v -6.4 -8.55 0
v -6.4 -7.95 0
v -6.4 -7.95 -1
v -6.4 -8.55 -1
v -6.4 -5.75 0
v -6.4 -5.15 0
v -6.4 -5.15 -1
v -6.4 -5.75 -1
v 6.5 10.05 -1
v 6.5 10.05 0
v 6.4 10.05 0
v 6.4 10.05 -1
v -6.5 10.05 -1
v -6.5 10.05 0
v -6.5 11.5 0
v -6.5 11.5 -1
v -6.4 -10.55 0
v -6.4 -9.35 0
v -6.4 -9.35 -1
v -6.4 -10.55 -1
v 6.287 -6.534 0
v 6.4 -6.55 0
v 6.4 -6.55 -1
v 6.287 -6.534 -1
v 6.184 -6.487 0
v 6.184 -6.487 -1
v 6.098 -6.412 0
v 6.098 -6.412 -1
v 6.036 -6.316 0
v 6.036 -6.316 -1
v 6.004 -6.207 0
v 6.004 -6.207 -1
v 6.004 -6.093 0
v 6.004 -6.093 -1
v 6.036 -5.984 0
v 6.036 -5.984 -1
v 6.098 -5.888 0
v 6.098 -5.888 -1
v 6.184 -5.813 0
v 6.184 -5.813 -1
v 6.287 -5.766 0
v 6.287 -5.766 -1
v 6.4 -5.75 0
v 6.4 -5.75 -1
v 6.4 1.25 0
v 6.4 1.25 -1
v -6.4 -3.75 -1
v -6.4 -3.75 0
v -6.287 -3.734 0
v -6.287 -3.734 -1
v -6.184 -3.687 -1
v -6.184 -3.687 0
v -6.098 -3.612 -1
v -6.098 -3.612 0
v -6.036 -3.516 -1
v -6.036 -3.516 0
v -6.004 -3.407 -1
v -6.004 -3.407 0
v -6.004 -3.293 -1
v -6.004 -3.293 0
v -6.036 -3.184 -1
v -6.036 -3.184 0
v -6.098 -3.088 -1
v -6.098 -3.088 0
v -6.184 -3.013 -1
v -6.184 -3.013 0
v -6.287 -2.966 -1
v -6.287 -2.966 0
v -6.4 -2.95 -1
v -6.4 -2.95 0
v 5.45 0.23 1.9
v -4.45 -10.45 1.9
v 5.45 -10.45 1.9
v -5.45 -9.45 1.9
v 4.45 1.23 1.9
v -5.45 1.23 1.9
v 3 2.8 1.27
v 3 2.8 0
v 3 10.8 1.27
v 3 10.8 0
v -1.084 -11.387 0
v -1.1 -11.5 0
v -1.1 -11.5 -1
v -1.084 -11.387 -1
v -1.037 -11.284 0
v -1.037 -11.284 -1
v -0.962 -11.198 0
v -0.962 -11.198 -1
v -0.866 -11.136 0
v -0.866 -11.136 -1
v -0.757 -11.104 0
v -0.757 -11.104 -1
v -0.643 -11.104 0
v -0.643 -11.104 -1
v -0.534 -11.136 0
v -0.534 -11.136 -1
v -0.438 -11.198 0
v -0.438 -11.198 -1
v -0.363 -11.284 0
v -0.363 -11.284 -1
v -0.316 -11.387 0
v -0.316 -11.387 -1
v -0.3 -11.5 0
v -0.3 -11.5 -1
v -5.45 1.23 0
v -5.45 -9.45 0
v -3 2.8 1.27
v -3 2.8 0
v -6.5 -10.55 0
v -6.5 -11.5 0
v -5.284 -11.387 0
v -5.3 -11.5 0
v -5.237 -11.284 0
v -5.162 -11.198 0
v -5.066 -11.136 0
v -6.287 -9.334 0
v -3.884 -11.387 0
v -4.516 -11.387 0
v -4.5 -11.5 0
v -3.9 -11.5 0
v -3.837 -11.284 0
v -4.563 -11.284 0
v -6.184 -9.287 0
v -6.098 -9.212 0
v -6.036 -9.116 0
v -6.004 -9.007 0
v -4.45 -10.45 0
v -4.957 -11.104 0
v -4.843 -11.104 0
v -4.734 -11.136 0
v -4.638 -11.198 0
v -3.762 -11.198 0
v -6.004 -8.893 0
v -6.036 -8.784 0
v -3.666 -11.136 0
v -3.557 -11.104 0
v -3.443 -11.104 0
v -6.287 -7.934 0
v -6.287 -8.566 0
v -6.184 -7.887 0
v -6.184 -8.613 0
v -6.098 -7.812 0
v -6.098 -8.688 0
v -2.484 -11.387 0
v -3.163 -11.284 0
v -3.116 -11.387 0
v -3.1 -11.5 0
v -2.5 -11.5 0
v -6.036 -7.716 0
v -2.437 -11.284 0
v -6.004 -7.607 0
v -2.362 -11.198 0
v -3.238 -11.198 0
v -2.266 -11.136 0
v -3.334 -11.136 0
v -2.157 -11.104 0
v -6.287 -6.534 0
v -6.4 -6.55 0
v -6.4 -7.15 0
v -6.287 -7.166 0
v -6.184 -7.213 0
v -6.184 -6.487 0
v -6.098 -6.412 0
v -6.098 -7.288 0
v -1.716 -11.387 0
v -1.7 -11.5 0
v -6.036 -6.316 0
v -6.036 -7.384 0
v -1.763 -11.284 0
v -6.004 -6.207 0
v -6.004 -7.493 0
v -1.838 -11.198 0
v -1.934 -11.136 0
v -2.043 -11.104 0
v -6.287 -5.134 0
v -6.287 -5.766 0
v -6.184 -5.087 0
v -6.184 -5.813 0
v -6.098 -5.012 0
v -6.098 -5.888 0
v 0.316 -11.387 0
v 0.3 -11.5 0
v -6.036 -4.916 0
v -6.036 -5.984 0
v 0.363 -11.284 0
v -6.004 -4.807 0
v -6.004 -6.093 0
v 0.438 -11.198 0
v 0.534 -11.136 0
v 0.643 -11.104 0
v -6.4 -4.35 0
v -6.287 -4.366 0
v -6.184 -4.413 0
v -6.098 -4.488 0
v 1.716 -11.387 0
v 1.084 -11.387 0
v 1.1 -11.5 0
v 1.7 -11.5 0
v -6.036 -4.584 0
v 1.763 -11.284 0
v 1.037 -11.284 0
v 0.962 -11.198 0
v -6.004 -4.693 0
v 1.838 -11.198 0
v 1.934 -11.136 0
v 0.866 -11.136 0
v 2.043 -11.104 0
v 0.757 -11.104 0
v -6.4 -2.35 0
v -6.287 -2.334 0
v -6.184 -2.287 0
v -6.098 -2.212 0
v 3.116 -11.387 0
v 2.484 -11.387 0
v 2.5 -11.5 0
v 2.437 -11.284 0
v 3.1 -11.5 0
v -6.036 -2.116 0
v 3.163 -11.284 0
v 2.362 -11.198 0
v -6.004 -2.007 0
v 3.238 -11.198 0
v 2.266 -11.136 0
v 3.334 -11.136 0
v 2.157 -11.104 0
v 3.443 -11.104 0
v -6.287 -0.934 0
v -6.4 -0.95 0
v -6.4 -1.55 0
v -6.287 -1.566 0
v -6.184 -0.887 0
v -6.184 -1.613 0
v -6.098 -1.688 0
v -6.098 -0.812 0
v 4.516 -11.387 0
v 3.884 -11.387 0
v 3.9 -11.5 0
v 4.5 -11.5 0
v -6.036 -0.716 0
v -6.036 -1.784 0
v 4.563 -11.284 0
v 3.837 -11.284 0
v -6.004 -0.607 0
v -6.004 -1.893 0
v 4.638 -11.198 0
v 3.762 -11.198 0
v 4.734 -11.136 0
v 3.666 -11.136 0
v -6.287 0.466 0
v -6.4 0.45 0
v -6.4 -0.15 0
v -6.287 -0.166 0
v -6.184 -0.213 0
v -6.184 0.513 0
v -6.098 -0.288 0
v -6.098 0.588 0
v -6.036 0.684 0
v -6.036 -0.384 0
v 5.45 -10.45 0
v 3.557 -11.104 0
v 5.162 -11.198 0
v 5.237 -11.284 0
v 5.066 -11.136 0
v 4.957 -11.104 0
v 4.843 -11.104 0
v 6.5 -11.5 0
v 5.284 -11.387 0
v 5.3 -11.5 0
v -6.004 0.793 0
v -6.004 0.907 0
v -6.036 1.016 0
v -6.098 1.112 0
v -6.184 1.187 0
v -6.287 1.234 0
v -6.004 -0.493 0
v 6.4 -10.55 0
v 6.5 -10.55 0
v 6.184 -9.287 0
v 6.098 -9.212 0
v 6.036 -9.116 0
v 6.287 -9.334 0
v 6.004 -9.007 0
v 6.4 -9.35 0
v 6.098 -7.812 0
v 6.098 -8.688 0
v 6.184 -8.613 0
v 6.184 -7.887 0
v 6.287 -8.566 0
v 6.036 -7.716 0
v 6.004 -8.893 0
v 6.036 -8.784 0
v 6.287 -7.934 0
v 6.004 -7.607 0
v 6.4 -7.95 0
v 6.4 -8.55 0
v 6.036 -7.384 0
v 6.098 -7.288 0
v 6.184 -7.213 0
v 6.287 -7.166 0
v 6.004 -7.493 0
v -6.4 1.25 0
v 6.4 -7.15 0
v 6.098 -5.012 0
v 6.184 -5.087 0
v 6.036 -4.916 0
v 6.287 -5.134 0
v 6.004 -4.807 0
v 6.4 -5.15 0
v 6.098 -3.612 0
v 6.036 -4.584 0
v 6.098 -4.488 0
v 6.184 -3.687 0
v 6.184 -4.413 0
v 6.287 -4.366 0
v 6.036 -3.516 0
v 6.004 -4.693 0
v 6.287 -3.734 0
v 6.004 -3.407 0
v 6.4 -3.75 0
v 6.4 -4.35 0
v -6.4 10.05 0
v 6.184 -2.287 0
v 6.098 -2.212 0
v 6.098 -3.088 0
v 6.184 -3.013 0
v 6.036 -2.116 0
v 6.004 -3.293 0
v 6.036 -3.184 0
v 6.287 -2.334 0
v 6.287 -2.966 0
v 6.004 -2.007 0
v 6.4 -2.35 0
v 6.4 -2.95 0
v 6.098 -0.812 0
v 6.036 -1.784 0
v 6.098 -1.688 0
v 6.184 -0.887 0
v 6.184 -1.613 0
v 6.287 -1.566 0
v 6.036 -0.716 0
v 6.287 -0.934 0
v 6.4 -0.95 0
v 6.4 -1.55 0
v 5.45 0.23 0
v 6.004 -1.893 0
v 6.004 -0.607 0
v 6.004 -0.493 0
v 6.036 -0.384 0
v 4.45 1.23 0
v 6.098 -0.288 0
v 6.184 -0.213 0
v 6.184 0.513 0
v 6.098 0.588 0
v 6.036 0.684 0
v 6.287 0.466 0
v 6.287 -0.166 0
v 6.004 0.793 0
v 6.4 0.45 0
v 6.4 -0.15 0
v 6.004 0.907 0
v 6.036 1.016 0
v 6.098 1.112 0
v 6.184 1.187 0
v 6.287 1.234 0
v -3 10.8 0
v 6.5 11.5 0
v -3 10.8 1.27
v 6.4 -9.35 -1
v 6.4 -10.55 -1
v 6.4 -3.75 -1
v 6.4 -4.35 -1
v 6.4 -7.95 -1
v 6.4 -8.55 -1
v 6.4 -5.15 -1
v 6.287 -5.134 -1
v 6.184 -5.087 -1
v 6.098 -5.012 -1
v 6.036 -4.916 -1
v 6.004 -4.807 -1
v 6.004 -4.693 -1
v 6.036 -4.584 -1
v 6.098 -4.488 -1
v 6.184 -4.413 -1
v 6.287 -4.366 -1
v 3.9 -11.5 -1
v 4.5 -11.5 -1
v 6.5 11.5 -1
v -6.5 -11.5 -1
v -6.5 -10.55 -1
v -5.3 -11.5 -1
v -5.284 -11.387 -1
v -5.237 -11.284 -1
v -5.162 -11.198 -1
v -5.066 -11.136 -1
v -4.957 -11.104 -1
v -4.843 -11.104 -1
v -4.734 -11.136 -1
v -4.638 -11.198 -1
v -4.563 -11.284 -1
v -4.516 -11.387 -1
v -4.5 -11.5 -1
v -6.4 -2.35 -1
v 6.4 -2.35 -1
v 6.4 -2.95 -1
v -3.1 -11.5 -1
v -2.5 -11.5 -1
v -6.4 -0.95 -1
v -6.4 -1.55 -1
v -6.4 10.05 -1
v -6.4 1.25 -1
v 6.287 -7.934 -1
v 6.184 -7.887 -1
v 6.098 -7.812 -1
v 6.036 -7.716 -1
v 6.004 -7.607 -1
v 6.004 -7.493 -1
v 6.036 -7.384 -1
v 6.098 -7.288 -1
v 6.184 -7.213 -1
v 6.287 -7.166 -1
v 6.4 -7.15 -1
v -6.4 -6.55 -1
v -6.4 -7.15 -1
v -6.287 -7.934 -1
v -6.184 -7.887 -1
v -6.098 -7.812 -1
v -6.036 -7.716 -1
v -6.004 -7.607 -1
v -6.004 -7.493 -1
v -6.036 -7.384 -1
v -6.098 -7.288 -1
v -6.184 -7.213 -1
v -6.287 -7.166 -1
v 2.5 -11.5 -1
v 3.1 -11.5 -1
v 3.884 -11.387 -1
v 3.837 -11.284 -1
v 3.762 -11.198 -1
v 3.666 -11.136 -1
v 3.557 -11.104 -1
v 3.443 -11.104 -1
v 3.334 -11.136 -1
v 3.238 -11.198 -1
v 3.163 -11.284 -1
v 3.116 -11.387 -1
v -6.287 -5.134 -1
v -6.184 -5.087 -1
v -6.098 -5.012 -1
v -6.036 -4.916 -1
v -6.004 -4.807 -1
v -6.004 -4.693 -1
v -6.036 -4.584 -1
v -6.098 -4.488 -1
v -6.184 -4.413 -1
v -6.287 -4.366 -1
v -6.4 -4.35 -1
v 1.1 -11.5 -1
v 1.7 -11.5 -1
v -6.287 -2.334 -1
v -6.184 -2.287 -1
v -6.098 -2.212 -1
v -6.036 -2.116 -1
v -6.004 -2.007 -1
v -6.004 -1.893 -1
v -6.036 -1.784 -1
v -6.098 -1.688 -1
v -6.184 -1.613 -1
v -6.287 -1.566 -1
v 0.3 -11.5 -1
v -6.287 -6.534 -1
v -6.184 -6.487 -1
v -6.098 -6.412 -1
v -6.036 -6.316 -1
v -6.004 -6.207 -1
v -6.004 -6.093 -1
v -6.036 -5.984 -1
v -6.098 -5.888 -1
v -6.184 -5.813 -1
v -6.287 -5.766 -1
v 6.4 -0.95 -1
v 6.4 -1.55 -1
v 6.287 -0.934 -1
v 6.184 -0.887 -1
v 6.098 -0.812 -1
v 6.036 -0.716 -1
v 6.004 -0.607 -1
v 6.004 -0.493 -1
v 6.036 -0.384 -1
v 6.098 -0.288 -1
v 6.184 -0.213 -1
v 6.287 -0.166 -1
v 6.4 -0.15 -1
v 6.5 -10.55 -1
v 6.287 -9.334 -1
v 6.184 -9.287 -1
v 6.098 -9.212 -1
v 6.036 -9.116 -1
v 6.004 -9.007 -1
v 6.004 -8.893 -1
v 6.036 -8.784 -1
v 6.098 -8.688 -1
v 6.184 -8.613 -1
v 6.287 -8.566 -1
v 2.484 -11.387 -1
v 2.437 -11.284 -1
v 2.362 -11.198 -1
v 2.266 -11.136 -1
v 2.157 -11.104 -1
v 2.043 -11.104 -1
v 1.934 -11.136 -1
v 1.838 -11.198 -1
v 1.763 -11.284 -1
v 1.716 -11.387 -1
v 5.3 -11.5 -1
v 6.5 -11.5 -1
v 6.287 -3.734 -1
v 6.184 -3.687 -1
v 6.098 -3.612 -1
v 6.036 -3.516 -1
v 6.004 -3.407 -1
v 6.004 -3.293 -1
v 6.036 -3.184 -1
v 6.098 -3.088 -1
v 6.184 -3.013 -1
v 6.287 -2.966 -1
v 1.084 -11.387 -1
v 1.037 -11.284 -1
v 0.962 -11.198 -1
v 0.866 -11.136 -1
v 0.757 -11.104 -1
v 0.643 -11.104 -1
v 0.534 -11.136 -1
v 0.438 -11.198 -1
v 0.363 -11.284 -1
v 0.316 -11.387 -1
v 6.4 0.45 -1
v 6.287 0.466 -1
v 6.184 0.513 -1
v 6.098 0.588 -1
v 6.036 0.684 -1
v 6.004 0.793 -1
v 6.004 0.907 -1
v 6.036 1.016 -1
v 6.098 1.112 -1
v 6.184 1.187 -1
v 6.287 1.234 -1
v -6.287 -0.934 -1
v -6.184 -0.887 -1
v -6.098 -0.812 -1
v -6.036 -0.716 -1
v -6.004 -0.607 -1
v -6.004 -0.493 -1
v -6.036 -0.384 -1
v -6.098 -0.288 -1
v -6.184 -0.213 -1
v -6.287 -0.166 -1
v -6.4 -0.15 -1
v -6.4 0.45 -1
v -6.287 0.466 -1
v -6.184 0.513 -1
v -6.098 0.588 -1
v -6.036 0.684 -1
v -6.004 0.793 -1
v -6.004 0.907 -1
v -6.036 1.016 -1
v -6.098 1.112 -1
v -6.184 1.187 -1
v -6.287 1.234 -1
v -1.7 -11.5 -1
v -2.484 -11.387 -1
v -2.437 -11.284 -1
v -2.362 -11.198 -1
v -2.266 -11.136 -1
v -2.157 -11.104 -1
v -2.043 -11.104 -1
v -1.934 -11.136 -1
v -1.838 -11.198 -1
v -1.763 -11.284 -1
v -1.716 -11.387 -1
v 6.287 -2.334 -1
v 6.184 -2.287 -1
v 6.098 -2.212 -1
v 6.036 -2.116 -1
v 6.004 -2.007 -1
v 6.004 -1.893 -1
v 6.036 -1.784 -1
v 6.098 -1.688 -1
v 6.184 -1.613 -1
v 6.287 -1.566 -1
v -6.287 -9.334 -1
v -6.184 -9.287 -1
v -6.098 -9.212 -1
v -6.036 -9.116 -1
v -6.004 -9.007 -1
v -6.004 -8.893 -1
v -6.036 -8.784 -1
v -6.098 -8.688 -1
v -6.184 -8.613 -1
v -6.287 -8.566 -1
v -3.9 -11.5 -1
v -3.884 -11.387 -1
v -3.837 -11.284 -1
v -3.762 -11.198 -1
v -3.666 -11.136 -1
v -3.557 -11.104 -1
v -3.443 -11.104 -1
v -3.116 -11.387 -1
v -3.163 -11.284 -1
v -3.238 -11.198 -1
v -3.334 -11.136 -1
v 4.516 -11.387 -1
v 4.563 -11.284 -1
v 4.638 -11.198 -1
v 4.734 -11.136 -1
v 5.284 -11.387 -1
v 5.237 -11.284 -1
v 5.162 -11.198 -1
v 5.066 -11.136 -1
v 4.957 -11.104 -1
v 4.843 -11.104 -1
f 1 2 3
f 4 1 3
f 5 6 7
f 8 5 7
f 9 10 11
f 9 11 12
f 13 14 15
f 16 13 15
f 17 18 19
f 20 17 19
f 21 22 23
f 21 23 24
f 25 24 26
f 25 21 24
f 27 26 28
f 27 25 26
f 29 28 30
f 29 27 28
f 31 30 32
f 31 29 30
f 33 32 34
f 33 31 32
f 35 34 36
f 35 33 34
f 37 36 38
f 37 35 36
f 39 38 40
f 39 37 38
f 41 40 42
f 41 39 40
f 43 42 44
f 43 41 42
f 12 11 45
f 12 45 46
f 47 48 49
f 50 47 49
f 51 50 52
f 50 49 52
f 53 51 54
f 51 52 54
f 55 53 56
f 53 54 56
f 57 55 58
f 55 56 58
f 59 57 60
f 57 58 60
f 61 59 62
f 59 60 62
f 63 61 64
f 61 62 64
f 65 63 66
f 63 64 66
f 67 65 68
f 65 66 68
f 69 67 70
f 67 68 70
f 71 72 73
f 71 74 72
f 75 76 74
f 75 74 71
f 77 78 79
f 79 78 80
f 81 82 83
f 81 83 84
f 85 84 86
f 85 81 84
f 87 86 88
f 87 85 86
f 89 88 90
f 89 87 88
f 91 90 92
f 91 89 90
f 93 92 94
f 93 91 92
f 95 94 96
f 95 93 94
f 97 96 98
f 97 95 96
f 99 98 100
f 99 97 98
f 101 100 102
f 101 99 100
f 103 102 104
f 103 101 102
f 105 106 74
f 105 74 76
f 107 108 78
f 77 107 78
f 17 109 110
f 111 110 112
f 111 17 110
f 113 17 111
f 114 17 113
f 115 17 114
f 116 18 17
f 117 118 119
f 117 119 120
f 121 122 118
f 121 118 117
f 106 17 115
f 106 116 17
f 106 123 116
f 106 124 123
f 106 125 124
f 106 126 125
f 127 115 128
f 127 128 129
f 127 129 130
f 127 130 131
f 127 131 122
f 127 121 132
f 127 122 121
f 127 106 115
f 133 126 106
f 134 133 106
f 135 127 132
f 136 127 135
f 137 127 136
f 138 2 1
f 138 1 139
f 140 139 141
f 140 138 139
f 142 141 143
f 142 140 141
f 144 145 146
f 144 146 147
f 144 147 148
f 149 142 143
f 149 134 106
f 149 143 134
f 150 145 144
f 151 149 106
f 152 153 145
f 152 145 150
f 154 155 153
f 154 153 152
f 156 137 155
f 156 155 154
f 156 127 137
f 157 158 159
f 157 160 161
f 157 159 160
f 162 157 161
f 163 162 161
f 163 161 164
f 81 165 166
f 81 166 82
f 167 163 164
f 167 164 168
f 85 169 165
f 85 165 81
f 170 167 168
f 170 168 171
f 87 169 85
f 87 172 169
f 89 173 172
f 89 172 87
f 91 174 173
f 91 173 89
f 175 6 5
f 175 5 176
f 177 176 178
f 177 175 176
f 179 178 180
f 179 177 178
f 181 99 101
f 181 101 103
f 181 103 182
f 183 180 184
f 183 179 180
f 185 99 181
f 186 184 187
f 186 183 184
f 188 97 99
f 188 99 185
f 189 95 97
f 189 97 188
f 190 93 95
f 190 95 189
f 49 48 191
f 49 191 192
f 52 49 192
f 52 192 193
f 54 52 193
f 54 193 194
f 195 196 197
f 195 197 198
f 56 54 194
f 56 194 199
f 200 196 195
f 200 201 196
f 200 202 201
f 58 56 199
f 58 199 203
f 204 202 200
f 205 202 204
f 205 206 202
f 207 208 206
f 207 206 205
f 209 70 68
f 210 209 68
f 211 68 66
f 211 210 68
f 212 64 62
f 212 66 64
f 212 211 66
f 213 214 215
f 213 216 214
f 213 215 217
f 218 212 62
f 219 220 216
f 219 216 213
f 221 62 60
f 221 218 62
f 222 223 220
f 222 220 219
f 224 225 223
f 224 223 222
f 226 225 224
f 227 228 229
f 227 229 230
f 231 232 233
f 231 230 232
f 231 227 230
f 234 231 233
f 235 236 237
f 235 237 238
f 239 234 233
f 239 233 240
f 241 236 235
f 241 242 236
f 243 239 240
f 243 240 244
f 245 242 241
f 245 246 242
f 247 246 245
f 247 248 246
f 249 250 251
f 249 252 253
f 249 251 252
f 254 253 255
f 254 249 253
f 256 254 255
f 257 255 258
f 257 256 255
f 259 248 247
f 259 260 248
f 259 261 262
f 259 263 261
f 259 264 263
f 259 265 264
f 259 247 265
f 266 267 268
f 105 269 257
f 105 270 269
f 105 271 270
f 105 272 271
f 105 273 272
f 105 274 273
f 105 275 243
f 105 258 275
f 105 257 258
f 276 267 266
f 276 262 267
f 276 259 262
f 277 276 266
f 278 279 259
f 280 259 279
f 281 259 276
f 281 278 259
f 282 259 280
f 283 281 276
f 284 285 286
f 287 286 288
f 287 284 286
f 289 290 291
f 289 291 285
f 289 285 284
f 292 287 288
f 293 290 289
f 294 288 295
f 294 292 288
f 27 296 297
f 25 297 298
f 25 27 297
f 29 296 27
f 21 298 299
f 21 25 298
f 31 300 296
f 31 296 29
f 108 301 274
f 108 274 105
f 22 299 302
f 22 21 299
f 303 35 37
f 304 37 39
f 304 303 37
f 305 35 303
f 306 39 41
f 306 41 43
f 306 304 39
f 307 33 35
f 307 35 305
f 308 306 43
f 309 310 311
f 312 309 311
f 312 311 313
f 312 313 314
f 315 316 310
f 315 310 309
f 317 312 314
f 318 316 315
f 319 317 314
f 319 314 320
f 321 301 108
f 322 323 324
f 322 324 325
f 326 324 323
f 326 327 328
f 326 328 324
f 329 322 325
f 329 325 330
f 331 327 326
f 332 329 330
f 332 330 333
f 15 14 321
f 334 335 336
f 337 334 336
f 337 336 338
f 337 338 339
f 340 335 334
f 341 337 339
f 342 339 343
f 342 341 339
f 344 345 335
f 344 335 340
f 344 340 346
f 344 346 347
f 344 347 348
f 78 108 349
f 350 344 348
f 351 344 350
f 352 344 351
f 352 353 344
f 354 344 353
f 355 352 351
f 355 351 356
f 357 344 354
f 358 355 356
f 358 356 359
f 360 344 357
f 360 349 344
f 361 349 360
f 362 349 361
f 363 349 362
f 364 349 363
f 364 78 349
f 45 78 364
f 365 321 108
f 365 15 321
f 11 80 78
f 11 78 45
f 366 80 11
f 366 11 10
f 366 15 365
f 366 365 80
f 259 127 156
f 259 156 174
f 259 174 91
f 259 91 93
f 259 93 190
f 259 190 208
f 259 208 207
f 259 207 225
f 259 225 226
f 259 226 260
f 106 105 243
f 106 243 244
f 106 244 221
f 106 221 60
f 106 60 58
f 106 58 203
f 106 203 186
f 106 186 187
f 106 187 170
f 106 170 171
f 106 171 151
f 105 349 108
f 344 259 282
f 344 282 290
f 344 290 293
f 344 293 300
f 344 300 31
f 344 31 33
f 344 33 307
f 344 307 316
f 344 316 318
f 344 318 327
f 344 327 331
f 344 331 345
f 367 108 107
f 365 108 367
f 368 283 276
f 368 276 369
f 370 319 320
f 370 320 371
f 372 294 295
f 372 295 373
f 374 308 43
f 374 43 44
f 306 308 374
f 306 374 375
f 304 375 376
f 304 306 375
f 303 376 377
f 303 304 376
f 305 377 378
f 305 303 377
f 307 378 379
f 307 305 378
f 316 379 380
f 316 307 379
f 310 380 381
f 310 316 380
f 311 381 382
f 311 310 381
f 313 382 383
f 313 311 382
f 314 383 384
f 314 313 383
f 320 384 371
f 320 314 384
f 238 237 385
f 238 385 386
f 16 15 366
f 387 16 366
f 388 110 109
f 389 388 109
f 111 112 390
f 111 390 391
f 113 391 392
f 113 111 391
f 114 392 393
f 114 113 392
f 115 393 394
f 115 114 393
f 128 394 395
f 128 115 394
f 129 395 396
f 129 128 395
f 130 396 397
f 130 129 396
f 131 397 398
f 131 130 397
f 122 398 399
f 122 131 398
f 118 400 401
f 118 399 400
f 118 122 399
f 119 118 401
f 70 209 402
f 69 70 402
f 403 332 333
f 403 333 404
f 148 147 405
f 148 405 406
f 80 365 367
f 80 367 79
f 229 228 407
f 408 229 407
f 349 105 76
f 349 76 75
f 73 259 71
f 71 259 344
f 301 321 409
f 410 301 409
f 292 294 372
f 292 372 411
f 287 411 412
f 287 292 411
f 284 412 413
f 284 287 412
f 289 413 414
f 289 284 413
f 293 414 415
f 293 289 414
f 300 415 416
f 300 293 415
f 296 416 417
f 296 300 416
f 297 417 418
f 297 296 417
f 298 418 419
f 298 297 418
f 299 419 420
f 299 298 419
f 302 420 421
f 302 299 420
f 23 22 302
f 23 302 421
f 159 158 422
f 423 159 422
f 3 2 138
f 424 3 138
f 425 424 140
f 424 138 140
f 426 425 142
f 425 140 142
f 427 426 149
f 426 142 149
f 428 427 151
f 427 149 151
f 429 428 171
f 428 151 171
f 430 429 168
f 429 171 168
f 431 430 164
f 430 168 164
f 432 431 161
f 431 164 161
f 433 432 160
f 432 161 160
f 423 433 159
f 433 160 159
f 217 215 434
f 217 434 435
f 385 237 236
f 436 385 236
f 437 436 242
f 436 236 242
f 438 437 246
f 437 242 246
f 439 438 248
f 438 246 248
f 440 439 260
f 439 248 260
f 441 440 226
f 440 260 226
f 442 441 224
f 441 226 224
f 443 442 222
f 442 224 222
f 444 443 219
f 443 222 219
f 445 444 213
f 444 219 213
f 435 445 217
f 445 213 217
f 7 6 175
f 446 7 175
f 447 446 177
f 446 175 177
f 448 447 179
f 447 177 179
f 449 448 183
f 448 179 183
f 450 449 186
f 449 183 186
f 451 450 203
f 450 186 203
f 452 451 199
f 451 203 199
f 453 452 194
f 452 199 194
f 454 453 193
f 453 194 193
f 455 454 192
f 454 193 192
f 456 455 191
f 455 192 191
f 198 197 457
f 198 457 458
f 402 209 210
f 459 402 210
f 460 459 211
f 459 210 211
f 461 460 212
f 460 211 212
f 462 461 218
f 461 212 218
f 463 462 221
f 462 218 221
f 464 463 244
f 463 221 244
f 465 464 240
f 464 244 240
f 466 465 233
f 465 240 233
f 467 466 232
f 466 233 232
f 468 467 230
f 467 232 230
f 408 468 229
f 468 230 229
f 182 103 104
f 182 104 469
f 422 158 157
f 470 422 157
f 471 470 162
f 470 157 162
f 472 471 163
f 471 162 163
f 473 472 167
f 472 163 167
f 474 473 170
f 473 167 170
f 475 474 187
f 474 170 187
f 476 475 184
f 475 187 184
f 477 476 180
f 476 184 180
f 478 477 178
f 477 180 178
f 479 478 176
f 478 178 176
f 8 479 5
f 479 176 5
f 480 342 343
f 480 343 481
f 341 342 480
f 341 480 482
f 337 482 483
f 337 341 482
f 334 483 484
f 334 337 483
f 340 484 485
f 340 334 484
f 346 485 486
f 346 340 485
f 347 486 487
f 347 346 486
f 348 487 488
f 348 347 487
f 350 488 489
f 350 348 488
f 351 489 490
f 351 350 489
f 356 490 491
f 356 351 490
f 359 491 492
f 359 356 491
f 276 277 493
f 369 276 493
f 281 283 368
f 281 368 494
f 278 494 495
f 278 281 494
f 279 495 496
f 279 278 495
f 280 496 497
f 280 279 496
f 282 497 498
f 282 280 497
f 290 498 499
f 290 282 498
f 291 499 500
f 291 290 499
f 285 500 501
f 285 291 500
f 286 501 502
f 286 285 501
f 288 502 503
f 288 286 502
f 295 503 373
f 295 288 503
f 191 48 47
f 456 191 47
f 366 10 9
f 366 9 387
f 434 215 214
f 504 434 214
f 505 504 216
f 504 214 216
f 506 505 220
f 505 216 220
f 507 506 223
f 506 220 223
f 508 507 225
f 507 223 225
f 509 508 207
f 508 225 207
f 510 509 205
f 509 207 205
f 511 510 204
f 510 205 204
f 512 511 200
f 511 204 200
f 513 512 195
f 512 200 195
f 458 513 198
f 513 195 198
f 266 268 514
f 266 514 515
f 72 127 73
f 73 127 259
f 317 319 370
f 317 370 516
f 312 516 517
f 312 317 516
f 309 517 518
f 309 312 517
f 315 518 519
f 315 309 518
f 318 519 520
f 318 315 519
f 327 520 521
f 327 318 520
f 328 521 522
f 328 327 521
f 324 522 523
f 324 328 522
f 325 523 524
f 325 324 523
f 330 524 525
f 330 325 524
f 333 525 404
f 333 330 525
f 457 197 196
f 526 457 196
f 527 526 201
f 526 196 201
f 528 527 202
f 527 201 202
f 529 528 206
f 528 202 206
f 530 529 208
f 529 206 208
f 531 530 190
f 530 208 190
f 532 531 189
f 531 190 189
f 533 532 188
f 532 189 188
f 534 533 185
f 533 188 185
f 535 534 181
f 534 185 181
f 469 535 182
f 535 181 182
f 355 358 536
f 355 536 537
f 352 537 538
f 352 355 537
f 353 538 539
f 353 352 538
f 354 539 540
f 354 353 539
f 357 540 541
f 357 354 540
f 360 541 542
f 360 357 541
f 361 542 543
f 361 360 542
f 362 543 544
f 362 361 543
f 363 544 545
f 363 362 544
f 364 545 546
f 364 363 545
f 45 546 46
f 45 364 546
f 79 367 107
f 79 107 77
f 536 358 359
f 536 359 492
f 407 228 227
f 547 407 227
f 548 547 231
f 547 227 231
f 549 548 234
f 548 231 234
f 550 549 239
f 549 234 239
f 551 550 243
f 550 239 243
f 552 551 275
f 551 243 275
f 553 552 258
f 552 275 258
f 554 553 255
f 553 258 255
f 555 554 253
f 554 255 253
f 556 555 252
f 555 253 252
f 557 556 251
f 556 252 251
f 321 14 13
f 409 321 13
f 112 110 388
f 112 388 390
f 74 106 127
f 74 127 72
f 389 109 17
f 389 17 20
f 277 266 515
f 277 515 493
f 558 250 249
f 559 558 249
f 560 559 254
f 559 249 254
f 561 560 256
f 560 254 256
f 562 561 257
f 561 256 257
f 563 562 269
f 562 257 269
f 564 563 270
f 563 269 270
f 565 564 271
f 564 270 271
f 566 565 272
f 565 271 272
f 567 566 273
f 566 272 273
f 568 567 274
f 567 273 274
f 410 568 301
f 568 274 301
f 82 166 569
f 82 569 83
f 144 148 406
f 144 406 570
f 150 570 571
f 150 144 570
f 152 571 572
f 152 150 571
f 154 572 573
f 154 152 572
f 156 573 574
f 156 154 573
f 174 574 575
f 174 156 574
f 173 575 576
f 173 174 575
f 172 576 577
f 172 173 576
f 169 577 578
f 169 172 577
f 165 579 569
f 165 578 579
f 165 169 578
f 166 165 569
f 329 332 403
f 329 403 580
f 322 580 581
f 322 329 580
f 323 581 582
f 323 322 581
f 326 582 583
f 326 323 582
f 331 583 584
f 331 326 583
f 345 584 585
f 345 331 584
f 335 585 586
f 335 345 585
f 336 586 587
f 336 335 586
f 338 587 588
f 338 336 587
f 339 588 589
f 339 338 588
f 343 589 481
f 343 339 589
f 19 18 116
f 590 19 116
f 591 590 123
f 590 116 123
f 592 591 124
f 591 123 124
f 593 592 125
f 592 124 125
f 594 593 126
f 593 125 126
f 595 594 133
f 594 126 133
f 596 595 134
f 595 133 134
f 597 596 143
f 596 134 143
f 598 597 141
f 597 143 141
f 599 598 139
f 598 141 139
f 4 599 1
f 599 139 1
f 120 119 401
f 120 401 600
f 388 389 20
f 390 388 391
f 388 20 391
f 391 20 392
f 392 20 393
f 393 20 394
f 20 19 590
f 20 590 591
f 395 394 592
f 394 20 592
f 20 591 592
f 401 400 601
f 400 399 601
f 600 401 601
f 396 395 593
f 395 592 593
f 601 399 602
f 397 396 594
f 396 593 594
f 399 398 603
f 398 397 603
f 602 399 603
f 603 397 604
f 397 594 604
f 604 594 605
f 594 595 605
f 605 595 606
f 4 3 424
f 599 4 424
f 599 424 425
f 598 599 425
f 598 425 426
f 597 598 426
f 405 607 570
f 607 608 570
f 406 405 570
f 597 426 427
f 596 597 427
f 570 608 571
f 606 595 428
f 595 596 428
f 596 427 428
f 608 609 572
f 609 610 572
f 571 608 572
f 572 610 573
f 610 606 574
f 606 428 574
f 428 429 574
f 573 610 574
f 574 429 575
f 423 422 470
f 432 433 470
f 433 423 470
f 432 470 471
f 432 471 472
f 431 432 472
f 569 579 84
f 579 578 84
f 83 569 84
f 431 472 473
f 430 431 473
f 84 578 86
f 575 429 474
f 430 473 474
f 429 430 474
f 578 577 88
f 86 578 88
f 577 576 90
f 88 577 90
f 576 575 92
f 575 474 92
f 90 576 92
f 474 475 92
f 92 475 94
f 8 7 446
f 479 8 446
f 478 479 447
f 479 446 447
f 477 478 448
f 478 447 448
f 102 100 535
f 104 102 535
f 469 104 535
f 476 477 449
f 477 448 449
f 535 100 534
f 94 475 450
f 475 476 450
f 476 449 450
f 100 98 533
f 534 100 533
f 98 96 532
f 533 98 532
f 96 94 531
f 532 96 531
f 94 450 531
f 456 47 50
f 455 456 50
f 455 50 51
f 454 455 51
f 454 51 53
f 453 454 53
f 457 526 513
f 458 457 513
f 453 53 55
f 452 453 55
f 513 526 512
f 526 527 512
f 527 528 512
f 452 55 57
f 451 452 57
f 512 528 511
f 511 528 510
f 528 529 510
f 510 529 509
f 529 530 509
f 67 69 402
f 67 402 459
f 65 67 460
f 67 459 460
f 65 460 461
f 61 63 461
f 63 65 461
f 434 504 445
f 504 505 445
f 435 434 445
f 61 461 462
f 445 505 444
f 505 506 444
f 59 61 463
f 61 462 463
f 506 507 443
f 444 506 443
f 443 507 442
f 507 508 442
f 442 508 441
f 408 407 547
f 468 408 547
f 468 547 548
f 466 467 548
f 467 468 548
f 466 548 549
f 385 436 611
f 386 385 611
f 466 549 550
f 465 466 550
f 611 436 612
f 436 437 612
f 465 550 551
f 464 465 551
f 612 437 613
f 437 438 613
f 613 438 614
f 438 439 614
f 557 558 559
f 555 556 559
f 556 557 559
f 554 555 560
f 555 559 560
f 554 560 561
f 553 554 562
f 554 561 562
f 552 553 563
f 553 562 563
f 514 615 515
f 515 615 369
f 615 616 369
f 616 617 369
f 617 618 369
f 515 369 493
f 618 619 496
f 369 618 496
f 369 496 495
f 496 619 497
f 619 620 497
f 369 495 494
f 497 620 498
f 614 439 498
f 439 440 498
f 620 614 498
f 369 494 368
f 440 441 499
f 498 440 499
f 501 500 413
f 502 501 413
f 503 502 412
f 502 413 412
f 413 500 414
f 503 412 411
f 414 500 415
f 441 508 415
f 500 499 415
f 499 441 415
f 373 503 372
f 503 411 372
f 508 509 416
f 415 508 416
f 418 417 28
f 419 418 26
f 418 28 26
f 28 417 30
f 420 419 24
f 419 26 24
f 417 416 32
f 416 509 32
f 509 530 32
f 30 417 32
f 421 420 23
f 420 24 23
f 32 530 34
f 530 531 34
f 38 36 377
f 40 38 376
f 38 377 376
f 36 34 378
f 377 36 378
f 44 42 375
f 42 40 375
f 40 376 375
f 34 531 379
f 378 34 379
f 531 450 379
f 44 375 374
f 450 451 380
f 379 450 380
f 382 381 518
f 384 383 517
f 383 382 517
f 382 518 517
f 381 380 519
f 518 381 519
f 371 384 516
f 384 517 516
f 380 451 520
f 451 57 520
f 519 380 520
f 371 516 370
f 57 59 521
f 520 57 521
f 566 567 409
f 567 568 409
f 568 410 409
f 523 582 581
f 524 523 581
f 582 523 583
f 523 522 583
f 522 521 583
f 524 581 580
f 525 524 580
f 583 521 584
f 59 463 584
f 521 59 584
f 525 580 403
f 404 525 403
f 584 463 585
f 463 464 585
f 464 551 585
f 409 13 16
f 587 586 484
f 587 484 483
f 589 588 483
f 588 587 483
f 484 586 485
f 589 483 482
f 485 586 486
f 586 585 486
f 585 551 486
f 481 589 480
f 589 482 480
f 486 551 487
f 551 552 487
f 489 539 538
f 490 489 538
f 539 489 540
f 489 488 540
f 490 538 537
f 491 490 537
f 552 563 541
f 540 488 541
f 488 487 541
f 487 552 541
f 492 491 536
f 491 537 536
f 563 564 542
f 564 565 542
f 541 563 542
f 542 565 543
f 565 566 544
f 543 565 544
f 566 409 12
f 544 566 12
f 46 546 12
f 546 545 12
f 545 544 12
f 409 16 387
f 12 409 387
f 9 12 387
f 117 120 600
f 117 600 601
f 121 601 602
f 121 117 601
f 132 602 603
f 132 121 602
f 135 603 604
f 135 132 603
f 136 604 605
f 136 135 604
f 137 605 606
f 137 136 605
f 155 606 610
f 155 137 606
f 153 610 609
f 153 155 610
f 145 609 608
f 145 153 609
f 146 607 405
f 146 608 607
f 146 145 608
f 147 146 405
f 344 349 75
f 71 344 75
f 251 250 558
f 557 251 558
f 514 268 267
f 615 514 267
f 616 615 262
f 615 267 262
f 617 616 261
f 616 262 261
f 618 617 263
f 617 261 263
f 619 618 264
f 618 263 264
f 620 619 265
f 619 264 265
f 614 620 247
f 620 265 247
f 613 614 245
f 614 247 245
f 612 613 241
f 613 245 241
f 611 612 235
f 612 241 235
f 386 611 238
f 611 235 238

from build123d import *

# Parameters (mm, degrees)
SKETCH_1_W             = 13
SKETCH_1_H             = 23
EXTRUDE_1_DEPTH        = 1
SKETCH_2_W             = 1
SKETCH_2_H             = 20.6
CUT_EXTRUDE_1_DEPTH    = 0.1
CUT_EXTRUDE_3_REACH    = 15.248
PATTERN_LINEAR_8_COUNT = 4
PATTERN_LINEAR_8_PITCH = 1.4
MIRROR_3_COPY_1_REACH  = 15.248
MIRROR_3_COPY_2_REACH  = 15.248
MIRROR_3_COPY_3_REACH  = 15.248
CUT_EXTRUDE_4_REACH    = 15.248
PATTERN_LINEAR_9_COUNT = 8
PATTERN_LINEAR_9_PITCH = 1.4
MIRROR_4_COPY_1_REACH  = 15.248
MIRROR_4_COPY_2_REACH  = 15.248
MIRROR_4_COPY_3_REACH  = 15.248
MIRROR_4_COPY_4_REACH  = 15.248
MIRROR_4_COPY_5_REACH  = 15.248
MIRROR_4_COPY_6_REACH  = 15.248
MIRROR_4_COPY_7_REACH  = 15.248
SKETCH_12_W            = 10.9
SKETCH_12_H            = 11.68
EXTRUDE_2_DEPTH        = 1.9
CHAMFER_1_SIZE         = 1
CHAMFER_2_SIZE         = 1
SKETCH_13_W            = 6
SKETCH_13_H            = 8
EXTRUDE_3_DEPTH        = 1.27


with BuildPart() as part:
    # 草图1 → 凸台-拉伸1 (new body)
    with BuildSketch(Plane.XY):
        Rectangle(SKETCH_1_W, SKETCH_1_H)
    extrude(amount=-EXTRUDE_1_DEPTH)

    # 草图2 → 切除-拉伸1 (cut)
    with BuildSketch(Plane(origin=(6.5, 0, 0), x_dir=(0, 0, -1), z_dir=(1, 0, 0))):
        with Locations((0.5, -0.25)):
            Rectangle(SKETCH_2_W, SKETCH_2_H)
    cut_extrude_1 = extrude(amount=-CUT_EXTRUDE_1_DEPTH, mode=Mode.SUBTRACT)

    # 镜向1: 切除-拉伸1 across plane
    add(cut_extrude_1.mirror(Plane.ZY), mode=Mode.SUBTRACT)

    # 草图5 → 切除-拉伸3 (cut, up to next)
    with BuildSketch(Plane.XY, mode=Mode.PRIVATE) as cut_extrude_3_sk1:
        with BuildLine():
            Line((0.3, -11.5), (1.1, -11.5))
            ThreePointArc((1.1, -11.5), (0.7, -11.1), (0.3, -11.5))
        make_face()
    cut_extrude_3_tool1 = extrude(cut_extrude_3_sk1.sketch, amount=-CUT_EXTRUDE_3_REACH, mode=Mode.PRIVATE) & part.part
    cut_extrude_3 = cut_extrude_3_tool1.solids().sort_by_distance((0.7, -11.330235, 0))[0]
    add(cut_extrude_3, mode=Mode.SUBTRACT)

    # 阵列(线性)8: 切除-拉伸3 ×4
    with Locations(*[(i * PATTERN_LINEAR_8_PITCH, 0, 0) for i in range(1, PATTERN_LINEAR_8_COUNT)]):
        add(cut_extrude_3, mode=Mode.SUBTRACT)

    # 镜向3: 切除-拉伸3 across plane
    add(cut_extrude_3.mirror(Plane.ZY), mode=Mode.SUBTRACT)

    # 镜向3 copy 1 sketch → 镜向3 copy 1 (cut, up to next)
    with BuildSketch(Plane(origin=(-1.4, 0, 0), x_dir=(-1, 0, 0), z_dir=(0, 0, 1)), mode=Mode.PRIVATE) as mirror_3_copy_1_sk1:
        with BuildLine():
            Line((0.3, 11.5), (1.1, 11.5))
            ThreePointArc((1.1, 11.5), (0.7, 11.1), (0.3, 11.5))
        make_face()
    mirror_3_copy_1_tool1 = extrude(mirror_3_copy_1_sk1.sketch, amount=-MIRROR_3_COPY_1_REACH, mode=Mode.PRIVATE) & part.part
    add(mirror_3_copy_1_tool1.solids().sort_by_distance((-2.1, -11.330235, 0))[0], mode=Mode.SUBTRACT)

    # 镜向3 copy 2 sketch → 镜向3 copy 2 (cut, up to next)
    with BuildSketch(Plane(origin=(-2.8, 0, 0), x_dir=(-1, 0, 0), z_dir=(0, 0, 1)), mode=Mode.PRIVATE) as mirror_3_copy_2_sk1:
        with BuildLine():
            Line((0.3, 11.5), (1.1, 11.5))
            ThreePointArc((1.1, 11.5), (0.7, 11.1), (0.3, 11.5))
        make_face()
    mirror_3_copy_2_tool1 = extrude(mirror_3_copy_2_sk1.sketch, amount=-MIRROR_3_COPY_2_REACH, mode=Mode.PRIVATE) & part.part
    add(mirror_3_copy_2_tool1.solids().sort_by_distance((-3.5, -11.330235, 0))[0], mode=Mode.SUBTRACT)

    # 镜向3 copy 3 sketch → 镜向3 copy 3 (cut, up to next)
    with BuildSketch(Plane(origin=(-4.2, 0, 0), x_dir=(-1, 0, 0), z_dir=(0, 0, 1)), mode=Mode.PRIVATE) as mirror_3_copy_3_sk1:
        with BuildLine():
            Line((0.3, 11.5), (1.1, 11.5))
            ThreePointArc((1.1, 11.5), (0.7, 11.1), (0.3, 11.5))
        make_face()
    mirror_3_copy_3_tool1 = extrude(mirror_3_copy_3_sk1.sketch, amount=-MIRROR_3_COPY_3_REACH, mode=Mode.PRIVATE) & part.part
    add(mirror_3_copy_3_tool1.solids().sort_by_distance((-4.9, -11.330235, 0))[0], mode=Mode.SUBTRACT)

    # 草图11 → 切除-拉伸4 (cut, up to next)
    with BuildSketch(Plane.XY, mode=Mode.PRIVATE) as cut_extrude_4_sk1:
        with BuildLine():
            Line((-6.4, -8.55), (-6.4, -9.35))
            ThreePointArc((-6.4, -9.35), (-6, -8.95), (-6.4, -8.55))
        make_face()
    cut_extrude_4_tool1 = extrude(cut_extrude_4_sk1.sketch, amount=-CUT_EXTRUDE_4_REACH, mode=Mode.PRIVATE) & part.part
    cut_extrude_4 = cut_extrude_4_tool1.solids().sort_by_distance((-6.230235, -8.95, 0))[0]
    add(cut_extrude_4, mode=Mode.SUBTRACT)

    # 阵列(线性)9: 切除-拉伸4 ×8
    with Locations(*[(0, i * PATTERN_LINEAR_9_PITCH, 0) for i in range(1, PATTERN_LINEAR_9_COUNT)]):
        add(cut_extrude_4, mode=Mode.SUBTRACT)

    # 镜向4: 切除-拉伸4 across plane
    add(cut_extrude_4.mirror(Plane.ZY), mode=Mode.SUBTRACT)

    # 镜向4 copy 1 sketch → 镜向4 copy 1 (cut, up to next)
    with BuildSketch(Plane(origin=(0, 1.4, 0), x_dir=(-1, 0, 0), z_dir=(0, 0, 1)), mode=Mode.PRIVATE) as mirror_4_copy_1_sk1:
        with BuildLine():
            Line((-6.4, 8.55), (-6.4, 9.35))
            ThreePointArc((-6.4, 9.35), (-6, 8.95), (-6.4, 8.55))
        make_face()
    mirror_4_copy_1_tool1 = extrude(mirror_4_copy_1_sk1.sketch, amount=-MIRROR_4_COPY_1_REACH, mode=Mode.PRIVATE) & part.part
    add(mirror_4_copy_1_tool1.solids().sort_by_distance((6.230235, -7.55, 0))[0], mode=Mode.SUBTRACT)

    # 镜向4 copy 2 sketch → 镜向4 copy 2 (cut, up to next)
    with BuildSketch(Plane(origin=(0, 2.8, 0), x_dir=(-1, 0, 0), z_dir=(0, 0, 1)), mode=Mode.PRIVATE) as mirror_4_copy_2_sk1:
        with BuildLine():
            Line((-6.4, 8.55), (-6.4, 9.35))
            ThreePointArc((-6.4, 9.35), (-6, 8.95), (-6.4, 8.55))
        make_face()
    mirror_4_copy_2_tool1 = extrude(mirror_4_copy_2_sk1.sketch, amount=-MIRROR_4_COPY_2_REACH, mode=Mode.PRIVATE) & part.part
    add(mirror_4_copy_2_tool1.solids().sort_by_distance((6.230235, -6.15, 0))[0], mode=Mode.SUBTRACT)

    # 镜向4 copy 3 sketch → 镜向4 copy 3 (cut, up to next)
    with BuildSketch(Plane(origin=(0, 4.2, 0), x_dir=(-1, 0, 0), z_dir=(0, 0, 1)), mode=Mode.PRIVATE) as mirror_4_copy_3_sk1:
        with BuildLine():
            Line((-6.4, 8.55), (-6.4, 9.35))
            ThreePointArc((-6.4, 9.35), (-6, 8.95), (-6.4, 8.55))
        make_face()
    mirror_4_copy_3_tool1 = extrude(mirror_4_copy_3_sk1.sketch, amount=-MIRROR_4_COPY_3_REACH, mode=Mode.PRIVATE) & part.part
    add(mirror_4_copy_3_tool1.solids().sort_by_distance((6.230235, -4.75, 0))[0], mode=Mode.SUBTRACT)

    # 镜向4 copy 4 sketch → 镜向4 copy 4 (cut, up to next)
    with BuildSketch(Plane(origin=(0, 5.6, 0), x_dir=(-1, 0, 0), z_dir=(0, 0, 1)), mode=Mode.PRIVATE) as mirror_4_copy_4_sk1:
        with BuildLine():
            Line((-6.4, 8.55), (-6.4, 9.35))
            ThreePointArc((-6.4, 9.35), (-6, 8.95), (-6.4, 8.55))
        make_face()
    mirror_4_copy_4_tool1 = extrude(mirror_4_copy_4_sk1.sketch, amount=-MIRROR_4_COPY_4_REACH, mode=Mode.PRIVATE) & part.part
    add(mirror_4_copy_4_tool1.solids().sort_by_distance((6.230235, -3.35, 0))[0], mode=Mode.SUBTRACT)

    # 镜向4 copy 5 sketch → 镜向4 copy 5 (cut, up to next)
    with BuildSketch(Plane(origin=(0, 7, 0), x_dir=(-1, 0, 0), z_dir=(0, 0, 1)), mode=Mode.PRIVATE) as mirror_4_copy_5_sk1:
        with BuildLine():
            Line((-6.4, 8.55), (-6.4, 9.35))
            ThreePointArc((-6.4, 9.35), (-6, 8.95), (-6.4, 8.55))
        make_face()
    mirror_4_copy_5_tool1 = extrude(mirror_4_copy_5_sk1.sketch, amount=-MIRROR_4_COPY_5_REACH, mode=Mode.PRIVATE) & part.part
    add(mirror_4_copy_5_tool1.solids().sort_by_distance((6.230235, -1.95, 0))[0], mode=Mode.SUBTRACT)

    # 镜向4 copy 6 sketch → 镜向4 copy 6 (cut, up to next)
    with BuildSketch(Plane(origin=(0, 8.4, 0), x_dir=(-1, 0, 0), z_dir=(0, 0, 1)), mode=Mode.PRIVATE) as mirror_4_copy_6_sk1:
        with BuildLine():
            Line((-6.4, 8.55), (-6.4, 9.35))
            ThreePointArc((-6.4, 9.35), (-6, 8.95), (-6.4, 8.55))
        make_face()
    mirror_4_copy_6_tool1 = extrude(mirror_4_copy_6_sk1.sketch, amount=-MIRROR_4_COPY_6_REACH, mode=Mode.PRIVATE) & part.part
    add(mirror_4_copy_6_tool1.solids().sort_by_distance((6.230235, -0.55, 0))[0], mode=Mode.SUBTRACT)

    # 镜向4 copy 7 sketch → 镜向4 copy 7 (cut, up to next)
    with BuildSketch(Plane(origin=(0, 9.8, 0), x_dir=(-1, 0, 0), z_dir=(0, 0, 1)), mode=Mode.PRIVATE) as mirror_4_copy_7_sk1:
        with BuildLine():
            Line((-6.4, 8.55), (-6.4, 9.35))
            ThreePointArc((-6.4, 9.35), (-6, 8.95), (-6.4, 8.55))
        make_face()
    mirror_4_copy_7_tool1 = extrude(mirror_4_copy_7_sk1.sketch, amount=-MIRROR_4_COPY_7_REACH, mode=Mode.PRIVATE) & part.part
    add(mirror_4_copy_7_tool1.solids().sort_by_distance((6.230235, 0.85, 0))[0], mode=Mode.SUBTRACT)

    # 草图12 → 凸台-拉伸2 (add)
    with BuildSketch(Plane.XY):
        with Locations((0, -4.61)):
            Rectangle(SKETCH_12_W, SKETCH_12_H)
    extrude(amount=EXTRUDE_2_DEPTH)

    # 倒角1
    chamfer_1_edges = [part.edges().sort_by_distance(p)[0] for p in [
        (5.45, 1.23, 0.95),
    ]]
    chamfer(chamfer_1_edges, length=CHAMFER_1_SIZE)

    # 倒角2
    chamfer_2_edges = [part.edges().sort_by_distance(p)[0] for p in [
        (-5.45, -10.45, 0.95),
    ]]
    chamfer(chamfer_2_edges, length=CHAMFER_2_SIZE)

    # 草图13 → 凸台-拉伸3 (add)
    with BuildSketch(Plane.XY):
        with Locations((0, 6.8)):
            Rectangle(SKETCH_13_W, SKETCH_13_H)
    extrude(amount=EXTRUDE_3_DEPTH)


solid = part.part
